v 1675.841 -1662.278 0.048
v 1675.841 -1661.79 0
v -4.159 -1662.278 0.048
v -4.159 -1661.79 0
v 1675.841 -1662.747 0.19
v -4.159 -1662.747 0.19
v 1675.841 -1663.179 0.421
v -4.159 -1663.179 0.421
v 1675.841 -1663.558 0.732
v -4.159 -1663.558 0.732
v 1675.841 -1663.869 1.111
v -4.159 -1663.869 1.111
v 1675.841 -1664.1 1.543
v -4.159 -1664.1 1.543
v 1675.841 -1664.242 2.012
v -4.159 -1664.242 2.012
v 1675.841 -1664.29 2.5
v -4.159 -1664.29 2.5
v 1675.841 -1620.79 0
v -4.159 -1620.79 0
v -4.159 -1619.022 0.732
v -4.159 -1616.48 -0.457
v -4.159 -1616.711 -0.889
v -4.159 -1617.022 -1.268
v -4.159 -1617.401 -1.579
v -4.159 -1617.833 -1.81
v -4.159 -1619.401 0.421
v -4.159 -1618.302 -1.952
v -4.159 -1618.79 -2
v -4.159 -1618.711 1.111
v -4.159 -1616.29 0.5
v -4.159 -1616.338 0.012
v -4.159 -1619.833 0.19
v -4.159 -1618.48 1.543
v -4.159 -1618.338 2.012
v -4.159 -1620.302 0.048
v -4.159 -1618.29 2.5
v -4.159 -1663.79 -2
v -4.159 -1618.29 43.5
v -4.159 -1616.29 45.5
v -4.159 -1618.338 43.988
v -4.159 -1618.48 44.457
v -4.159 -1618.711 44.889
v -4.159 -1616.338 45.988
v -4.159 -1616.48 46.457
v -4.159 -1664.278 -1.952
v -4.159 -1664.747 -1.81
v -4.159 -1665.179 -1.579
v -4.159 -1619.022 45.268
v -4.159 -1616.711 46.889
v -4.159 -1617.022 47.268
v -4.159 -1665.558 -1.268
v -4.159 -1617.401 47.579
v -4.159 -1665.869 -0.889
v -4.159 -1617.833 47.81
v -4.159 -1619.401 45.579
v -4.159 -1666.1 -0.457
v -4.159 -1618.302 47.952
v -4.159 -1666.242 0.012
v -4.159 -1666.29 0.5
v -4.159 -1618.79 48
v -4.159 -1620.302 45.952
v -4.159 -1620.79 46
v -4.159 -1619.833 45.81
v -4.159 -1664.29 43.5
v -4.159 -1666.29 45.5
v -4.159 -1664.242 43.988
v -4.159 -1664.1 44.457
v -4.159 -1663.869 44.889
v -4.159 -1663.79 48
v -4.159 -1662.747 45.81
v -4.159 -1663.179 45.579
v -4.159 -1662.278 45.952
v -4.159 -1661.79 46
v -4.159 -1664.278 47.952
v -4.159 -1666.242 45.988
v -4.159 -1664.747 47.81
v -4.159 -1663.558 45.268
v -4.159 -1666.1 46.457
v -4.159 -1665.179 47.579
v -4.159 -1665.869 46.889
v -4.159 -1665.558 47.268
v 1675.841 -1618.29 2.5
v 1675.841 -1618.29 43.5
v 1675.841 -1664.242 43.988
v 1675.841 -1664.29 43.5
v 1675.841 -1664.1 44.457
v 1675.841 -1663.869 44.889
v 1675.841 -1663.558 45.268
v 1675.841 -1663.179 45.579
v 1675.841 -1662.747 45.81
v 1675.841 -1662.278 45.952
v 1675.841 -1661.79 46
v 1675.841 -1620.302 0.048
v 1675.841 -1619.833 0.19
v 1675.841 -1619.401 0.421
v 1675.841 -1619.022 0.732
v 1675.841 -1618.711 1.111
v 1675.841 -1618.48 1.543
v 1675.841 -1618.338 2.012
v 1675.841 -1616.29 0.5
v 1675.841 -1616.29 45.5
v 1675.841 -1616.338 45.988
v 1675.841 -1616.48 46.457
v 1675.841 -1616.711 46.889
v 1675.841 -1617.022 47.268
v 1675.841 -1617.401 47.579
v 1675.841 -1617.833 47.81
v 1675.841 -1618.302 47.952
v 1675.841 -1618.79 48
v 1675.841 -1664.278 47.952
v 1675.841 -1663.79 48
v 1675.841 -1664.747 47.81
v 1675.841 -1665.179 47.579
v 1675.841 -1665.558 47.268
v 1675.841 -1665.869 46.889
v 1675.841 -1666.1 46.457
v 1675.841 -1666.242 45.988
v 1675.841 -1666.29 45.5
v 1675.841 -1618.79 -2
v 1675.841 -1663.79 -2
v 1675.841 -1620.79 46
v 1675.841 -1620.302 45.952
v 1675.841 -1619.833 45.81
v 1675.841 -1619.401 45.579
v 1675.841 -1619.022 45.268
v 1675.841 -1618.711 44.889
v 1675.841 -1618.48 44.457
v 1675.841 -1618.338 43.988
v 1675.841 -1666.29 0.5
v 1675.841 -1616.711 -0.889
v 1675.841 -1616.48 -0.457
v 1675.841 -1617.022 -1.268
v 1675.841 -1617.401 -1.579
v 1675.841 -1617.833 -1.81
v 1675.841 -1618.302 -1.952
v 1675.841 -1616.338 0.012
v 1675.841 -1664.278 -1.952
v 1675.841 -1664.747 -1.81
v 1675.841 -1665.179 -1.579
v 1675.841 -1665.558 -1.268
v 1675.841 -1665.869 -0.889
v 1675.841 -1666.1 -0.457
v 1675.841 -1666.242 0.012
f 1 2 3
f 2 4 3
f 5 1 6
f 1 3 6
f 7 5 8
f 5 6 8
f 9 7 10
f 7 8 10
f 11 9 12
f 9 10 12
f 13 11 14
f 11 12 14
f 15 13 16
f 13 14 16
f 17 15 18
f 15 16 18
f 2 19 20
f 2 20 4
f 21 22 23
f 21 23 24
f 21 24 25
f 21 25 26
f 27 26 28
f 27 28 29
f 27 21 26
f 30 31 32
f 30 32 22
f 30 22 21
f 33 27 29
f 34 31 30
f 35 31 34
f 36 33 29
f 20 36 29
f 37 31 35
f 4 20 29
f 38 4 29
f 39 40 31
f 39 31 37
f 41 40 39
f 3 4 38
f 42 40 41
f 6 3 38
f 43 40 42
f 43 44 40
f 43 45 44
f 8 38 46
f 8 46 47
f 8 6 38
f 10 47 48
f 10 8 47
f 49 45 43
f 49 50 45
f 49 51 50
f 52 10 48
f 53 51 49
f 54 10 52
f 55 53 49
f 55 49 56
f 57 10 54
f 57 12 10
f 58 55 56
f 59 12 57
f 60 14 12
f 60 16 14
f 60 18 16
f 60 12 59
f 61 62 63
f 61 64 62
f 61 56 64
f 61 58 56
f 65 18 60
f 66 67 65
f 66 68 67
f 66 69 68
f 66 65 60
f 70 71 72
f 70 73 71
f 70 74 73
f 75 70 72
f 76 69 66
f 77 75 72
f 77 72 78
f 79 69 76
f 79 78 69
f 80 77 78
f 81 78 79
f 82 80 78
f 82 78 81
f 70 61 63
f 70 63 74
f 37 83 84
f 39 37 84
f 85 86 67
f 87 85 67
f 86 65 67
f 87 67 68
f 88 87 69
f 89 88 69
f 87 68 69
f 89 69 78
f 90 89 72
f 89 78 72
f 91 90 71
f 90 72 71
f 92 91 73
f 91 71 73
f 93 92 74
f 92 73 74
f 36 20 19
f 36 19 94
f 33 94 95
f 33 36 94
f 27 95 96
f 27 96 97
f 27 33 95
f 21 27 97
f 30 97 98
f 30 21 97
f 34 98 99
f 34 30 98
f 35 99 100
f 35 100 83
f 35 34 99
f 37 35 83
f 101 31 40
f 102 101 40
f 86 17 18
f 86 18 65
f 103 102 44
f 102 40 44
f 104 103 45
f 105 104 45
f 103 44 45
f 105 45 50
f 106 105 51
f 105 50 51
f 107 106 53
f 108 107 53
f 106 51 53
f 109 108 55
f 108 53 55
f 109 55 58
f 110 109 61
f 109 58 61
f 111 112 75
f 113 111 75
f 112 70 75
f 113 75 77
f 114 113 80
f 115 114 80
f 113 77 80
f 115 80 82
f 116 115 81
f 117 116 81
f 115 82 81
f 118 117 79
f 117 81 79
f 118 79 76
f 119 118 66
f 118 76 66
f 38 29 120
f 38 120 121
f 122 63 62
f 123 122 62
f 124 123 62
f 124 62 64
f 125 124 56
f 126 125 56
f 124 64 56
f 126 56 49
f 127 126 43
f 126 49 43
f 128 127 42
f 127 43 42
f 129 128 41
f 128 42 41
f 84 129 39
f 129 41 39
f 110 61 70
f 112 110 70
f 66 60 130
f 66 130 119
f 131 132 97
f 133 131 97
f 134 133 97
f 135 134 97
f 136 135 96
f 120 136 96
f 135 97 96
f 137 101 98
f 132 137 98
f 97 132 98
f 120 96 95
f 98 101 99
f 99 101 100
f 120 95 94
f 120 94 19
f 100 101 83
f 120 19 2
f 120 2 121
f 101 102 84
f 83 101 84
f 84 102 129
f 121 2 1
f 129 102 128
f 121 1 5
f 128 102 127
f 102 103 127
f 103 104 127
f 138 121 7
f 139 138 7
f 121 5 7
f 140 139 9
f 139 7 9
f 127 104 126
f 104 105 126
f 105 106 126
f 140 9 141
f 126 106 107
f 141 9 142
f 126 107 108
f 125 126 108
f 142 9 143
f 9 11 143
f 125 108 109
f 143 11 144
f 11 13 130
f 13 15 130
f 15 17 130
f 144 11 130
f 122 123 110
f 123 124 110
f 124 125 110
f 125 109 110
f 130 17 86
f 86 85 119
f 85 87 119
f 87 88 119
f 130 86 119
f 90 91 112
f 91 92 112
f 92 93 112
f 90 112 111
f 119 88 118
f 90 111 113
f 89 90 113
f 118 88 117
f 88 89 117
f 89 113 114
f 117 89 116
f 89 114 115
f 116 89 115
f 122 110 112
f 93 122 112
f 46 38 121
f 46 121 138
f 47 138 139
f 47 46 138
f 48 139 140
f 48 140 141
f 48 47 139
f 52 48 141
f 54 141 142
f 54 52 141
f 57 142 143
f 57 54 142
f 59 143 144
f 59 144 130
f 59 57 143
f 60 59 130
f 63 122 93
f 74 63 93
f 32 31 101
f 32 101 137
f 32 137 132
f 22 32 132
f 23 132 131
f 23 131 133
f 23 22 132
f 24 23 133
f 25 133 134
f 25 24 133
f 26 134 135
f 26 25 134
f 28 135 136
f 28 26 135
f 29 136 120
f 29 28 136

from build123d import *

# Parameters (mm, degrees)
F0_W      = 50
F0_H      = 50
F0_W_2    = 46
F0_H_2    = 46
F1_DEPTH  = 860
F2_R      = 2.5
F3_R      = 2.5
F8_DEPTH  = 820
F9_ANGLE  = 90
F10_ANGLE = 90


with BuildPart() as f1:
    # F0 (on Top) → F1 (new body)
    with BuildSketch(Plane.XY):
        with Locations((-29.1589260101, 36.7100374773)):
            Rectangle(F0_W, F0_H)
        with Locations((-29.1589260101, 36.7100374773)):
            Rectangle(F0_W_2, F0_H_2, mode=Mode.SUBTRACT)
    extrude(amount=F1_DEPTH)

    # F2
    f2_edges = [f1.edges().sort_by_distance(p)[0] for p in [
        (-4.158926, 61.710037, 430),
        (-54.158926, 61.710037, 430),
        (-4.158926, 11.710037, 430),
        (-54.158926, 11.710037, 430),
    ]]
    fillet(f2_edges, radius=F2_R)

    # F3
    f3_edges = [f1.edges().sort_by_distance(p)[0] for p in [
        (-6.158926, 59.710037, 430),
        (-52.158926, 59.710037, 430),
        (-52.158926, 13.710037, 430),
        (-6.158926, 13.710037, 430),
    ]]
    fillet(f3_edges, radius=F3_R)


with BuildPart() as f4_1:
    # F4: copy of F1
    add(f1.part)


with BuildPart() as f6_1:
    # F6: copy of F1
    add(f1.part)


with BuildPart() as f1_1:
    add(f1.part)

    # F8 (add, symmetric): a face of the model
    f8_faces = [f1_1.faces().sort_by_distance(p)[0] for p in [
        (-29.1589260101, 13.0029306961, 860),
    ]]
    extrude(f8_faces, amount=F8_DEPTH, both=True)


with BuildPart() as f1_2:
    # F9: moved
    add(f1_1.part.rotate(Axis((-29.1589260101, 13.7100374773, 0), (1, 0, 0)), F9_ANGLE))


with BuildPart() as f1_3:
    # F10: moved
    add(f1_2.part.rotate(Axis((-4.1589260101, -1666.2899625227, 23), (0, 0, -1)), F10_ANGLE))


solid = f1_3.part
